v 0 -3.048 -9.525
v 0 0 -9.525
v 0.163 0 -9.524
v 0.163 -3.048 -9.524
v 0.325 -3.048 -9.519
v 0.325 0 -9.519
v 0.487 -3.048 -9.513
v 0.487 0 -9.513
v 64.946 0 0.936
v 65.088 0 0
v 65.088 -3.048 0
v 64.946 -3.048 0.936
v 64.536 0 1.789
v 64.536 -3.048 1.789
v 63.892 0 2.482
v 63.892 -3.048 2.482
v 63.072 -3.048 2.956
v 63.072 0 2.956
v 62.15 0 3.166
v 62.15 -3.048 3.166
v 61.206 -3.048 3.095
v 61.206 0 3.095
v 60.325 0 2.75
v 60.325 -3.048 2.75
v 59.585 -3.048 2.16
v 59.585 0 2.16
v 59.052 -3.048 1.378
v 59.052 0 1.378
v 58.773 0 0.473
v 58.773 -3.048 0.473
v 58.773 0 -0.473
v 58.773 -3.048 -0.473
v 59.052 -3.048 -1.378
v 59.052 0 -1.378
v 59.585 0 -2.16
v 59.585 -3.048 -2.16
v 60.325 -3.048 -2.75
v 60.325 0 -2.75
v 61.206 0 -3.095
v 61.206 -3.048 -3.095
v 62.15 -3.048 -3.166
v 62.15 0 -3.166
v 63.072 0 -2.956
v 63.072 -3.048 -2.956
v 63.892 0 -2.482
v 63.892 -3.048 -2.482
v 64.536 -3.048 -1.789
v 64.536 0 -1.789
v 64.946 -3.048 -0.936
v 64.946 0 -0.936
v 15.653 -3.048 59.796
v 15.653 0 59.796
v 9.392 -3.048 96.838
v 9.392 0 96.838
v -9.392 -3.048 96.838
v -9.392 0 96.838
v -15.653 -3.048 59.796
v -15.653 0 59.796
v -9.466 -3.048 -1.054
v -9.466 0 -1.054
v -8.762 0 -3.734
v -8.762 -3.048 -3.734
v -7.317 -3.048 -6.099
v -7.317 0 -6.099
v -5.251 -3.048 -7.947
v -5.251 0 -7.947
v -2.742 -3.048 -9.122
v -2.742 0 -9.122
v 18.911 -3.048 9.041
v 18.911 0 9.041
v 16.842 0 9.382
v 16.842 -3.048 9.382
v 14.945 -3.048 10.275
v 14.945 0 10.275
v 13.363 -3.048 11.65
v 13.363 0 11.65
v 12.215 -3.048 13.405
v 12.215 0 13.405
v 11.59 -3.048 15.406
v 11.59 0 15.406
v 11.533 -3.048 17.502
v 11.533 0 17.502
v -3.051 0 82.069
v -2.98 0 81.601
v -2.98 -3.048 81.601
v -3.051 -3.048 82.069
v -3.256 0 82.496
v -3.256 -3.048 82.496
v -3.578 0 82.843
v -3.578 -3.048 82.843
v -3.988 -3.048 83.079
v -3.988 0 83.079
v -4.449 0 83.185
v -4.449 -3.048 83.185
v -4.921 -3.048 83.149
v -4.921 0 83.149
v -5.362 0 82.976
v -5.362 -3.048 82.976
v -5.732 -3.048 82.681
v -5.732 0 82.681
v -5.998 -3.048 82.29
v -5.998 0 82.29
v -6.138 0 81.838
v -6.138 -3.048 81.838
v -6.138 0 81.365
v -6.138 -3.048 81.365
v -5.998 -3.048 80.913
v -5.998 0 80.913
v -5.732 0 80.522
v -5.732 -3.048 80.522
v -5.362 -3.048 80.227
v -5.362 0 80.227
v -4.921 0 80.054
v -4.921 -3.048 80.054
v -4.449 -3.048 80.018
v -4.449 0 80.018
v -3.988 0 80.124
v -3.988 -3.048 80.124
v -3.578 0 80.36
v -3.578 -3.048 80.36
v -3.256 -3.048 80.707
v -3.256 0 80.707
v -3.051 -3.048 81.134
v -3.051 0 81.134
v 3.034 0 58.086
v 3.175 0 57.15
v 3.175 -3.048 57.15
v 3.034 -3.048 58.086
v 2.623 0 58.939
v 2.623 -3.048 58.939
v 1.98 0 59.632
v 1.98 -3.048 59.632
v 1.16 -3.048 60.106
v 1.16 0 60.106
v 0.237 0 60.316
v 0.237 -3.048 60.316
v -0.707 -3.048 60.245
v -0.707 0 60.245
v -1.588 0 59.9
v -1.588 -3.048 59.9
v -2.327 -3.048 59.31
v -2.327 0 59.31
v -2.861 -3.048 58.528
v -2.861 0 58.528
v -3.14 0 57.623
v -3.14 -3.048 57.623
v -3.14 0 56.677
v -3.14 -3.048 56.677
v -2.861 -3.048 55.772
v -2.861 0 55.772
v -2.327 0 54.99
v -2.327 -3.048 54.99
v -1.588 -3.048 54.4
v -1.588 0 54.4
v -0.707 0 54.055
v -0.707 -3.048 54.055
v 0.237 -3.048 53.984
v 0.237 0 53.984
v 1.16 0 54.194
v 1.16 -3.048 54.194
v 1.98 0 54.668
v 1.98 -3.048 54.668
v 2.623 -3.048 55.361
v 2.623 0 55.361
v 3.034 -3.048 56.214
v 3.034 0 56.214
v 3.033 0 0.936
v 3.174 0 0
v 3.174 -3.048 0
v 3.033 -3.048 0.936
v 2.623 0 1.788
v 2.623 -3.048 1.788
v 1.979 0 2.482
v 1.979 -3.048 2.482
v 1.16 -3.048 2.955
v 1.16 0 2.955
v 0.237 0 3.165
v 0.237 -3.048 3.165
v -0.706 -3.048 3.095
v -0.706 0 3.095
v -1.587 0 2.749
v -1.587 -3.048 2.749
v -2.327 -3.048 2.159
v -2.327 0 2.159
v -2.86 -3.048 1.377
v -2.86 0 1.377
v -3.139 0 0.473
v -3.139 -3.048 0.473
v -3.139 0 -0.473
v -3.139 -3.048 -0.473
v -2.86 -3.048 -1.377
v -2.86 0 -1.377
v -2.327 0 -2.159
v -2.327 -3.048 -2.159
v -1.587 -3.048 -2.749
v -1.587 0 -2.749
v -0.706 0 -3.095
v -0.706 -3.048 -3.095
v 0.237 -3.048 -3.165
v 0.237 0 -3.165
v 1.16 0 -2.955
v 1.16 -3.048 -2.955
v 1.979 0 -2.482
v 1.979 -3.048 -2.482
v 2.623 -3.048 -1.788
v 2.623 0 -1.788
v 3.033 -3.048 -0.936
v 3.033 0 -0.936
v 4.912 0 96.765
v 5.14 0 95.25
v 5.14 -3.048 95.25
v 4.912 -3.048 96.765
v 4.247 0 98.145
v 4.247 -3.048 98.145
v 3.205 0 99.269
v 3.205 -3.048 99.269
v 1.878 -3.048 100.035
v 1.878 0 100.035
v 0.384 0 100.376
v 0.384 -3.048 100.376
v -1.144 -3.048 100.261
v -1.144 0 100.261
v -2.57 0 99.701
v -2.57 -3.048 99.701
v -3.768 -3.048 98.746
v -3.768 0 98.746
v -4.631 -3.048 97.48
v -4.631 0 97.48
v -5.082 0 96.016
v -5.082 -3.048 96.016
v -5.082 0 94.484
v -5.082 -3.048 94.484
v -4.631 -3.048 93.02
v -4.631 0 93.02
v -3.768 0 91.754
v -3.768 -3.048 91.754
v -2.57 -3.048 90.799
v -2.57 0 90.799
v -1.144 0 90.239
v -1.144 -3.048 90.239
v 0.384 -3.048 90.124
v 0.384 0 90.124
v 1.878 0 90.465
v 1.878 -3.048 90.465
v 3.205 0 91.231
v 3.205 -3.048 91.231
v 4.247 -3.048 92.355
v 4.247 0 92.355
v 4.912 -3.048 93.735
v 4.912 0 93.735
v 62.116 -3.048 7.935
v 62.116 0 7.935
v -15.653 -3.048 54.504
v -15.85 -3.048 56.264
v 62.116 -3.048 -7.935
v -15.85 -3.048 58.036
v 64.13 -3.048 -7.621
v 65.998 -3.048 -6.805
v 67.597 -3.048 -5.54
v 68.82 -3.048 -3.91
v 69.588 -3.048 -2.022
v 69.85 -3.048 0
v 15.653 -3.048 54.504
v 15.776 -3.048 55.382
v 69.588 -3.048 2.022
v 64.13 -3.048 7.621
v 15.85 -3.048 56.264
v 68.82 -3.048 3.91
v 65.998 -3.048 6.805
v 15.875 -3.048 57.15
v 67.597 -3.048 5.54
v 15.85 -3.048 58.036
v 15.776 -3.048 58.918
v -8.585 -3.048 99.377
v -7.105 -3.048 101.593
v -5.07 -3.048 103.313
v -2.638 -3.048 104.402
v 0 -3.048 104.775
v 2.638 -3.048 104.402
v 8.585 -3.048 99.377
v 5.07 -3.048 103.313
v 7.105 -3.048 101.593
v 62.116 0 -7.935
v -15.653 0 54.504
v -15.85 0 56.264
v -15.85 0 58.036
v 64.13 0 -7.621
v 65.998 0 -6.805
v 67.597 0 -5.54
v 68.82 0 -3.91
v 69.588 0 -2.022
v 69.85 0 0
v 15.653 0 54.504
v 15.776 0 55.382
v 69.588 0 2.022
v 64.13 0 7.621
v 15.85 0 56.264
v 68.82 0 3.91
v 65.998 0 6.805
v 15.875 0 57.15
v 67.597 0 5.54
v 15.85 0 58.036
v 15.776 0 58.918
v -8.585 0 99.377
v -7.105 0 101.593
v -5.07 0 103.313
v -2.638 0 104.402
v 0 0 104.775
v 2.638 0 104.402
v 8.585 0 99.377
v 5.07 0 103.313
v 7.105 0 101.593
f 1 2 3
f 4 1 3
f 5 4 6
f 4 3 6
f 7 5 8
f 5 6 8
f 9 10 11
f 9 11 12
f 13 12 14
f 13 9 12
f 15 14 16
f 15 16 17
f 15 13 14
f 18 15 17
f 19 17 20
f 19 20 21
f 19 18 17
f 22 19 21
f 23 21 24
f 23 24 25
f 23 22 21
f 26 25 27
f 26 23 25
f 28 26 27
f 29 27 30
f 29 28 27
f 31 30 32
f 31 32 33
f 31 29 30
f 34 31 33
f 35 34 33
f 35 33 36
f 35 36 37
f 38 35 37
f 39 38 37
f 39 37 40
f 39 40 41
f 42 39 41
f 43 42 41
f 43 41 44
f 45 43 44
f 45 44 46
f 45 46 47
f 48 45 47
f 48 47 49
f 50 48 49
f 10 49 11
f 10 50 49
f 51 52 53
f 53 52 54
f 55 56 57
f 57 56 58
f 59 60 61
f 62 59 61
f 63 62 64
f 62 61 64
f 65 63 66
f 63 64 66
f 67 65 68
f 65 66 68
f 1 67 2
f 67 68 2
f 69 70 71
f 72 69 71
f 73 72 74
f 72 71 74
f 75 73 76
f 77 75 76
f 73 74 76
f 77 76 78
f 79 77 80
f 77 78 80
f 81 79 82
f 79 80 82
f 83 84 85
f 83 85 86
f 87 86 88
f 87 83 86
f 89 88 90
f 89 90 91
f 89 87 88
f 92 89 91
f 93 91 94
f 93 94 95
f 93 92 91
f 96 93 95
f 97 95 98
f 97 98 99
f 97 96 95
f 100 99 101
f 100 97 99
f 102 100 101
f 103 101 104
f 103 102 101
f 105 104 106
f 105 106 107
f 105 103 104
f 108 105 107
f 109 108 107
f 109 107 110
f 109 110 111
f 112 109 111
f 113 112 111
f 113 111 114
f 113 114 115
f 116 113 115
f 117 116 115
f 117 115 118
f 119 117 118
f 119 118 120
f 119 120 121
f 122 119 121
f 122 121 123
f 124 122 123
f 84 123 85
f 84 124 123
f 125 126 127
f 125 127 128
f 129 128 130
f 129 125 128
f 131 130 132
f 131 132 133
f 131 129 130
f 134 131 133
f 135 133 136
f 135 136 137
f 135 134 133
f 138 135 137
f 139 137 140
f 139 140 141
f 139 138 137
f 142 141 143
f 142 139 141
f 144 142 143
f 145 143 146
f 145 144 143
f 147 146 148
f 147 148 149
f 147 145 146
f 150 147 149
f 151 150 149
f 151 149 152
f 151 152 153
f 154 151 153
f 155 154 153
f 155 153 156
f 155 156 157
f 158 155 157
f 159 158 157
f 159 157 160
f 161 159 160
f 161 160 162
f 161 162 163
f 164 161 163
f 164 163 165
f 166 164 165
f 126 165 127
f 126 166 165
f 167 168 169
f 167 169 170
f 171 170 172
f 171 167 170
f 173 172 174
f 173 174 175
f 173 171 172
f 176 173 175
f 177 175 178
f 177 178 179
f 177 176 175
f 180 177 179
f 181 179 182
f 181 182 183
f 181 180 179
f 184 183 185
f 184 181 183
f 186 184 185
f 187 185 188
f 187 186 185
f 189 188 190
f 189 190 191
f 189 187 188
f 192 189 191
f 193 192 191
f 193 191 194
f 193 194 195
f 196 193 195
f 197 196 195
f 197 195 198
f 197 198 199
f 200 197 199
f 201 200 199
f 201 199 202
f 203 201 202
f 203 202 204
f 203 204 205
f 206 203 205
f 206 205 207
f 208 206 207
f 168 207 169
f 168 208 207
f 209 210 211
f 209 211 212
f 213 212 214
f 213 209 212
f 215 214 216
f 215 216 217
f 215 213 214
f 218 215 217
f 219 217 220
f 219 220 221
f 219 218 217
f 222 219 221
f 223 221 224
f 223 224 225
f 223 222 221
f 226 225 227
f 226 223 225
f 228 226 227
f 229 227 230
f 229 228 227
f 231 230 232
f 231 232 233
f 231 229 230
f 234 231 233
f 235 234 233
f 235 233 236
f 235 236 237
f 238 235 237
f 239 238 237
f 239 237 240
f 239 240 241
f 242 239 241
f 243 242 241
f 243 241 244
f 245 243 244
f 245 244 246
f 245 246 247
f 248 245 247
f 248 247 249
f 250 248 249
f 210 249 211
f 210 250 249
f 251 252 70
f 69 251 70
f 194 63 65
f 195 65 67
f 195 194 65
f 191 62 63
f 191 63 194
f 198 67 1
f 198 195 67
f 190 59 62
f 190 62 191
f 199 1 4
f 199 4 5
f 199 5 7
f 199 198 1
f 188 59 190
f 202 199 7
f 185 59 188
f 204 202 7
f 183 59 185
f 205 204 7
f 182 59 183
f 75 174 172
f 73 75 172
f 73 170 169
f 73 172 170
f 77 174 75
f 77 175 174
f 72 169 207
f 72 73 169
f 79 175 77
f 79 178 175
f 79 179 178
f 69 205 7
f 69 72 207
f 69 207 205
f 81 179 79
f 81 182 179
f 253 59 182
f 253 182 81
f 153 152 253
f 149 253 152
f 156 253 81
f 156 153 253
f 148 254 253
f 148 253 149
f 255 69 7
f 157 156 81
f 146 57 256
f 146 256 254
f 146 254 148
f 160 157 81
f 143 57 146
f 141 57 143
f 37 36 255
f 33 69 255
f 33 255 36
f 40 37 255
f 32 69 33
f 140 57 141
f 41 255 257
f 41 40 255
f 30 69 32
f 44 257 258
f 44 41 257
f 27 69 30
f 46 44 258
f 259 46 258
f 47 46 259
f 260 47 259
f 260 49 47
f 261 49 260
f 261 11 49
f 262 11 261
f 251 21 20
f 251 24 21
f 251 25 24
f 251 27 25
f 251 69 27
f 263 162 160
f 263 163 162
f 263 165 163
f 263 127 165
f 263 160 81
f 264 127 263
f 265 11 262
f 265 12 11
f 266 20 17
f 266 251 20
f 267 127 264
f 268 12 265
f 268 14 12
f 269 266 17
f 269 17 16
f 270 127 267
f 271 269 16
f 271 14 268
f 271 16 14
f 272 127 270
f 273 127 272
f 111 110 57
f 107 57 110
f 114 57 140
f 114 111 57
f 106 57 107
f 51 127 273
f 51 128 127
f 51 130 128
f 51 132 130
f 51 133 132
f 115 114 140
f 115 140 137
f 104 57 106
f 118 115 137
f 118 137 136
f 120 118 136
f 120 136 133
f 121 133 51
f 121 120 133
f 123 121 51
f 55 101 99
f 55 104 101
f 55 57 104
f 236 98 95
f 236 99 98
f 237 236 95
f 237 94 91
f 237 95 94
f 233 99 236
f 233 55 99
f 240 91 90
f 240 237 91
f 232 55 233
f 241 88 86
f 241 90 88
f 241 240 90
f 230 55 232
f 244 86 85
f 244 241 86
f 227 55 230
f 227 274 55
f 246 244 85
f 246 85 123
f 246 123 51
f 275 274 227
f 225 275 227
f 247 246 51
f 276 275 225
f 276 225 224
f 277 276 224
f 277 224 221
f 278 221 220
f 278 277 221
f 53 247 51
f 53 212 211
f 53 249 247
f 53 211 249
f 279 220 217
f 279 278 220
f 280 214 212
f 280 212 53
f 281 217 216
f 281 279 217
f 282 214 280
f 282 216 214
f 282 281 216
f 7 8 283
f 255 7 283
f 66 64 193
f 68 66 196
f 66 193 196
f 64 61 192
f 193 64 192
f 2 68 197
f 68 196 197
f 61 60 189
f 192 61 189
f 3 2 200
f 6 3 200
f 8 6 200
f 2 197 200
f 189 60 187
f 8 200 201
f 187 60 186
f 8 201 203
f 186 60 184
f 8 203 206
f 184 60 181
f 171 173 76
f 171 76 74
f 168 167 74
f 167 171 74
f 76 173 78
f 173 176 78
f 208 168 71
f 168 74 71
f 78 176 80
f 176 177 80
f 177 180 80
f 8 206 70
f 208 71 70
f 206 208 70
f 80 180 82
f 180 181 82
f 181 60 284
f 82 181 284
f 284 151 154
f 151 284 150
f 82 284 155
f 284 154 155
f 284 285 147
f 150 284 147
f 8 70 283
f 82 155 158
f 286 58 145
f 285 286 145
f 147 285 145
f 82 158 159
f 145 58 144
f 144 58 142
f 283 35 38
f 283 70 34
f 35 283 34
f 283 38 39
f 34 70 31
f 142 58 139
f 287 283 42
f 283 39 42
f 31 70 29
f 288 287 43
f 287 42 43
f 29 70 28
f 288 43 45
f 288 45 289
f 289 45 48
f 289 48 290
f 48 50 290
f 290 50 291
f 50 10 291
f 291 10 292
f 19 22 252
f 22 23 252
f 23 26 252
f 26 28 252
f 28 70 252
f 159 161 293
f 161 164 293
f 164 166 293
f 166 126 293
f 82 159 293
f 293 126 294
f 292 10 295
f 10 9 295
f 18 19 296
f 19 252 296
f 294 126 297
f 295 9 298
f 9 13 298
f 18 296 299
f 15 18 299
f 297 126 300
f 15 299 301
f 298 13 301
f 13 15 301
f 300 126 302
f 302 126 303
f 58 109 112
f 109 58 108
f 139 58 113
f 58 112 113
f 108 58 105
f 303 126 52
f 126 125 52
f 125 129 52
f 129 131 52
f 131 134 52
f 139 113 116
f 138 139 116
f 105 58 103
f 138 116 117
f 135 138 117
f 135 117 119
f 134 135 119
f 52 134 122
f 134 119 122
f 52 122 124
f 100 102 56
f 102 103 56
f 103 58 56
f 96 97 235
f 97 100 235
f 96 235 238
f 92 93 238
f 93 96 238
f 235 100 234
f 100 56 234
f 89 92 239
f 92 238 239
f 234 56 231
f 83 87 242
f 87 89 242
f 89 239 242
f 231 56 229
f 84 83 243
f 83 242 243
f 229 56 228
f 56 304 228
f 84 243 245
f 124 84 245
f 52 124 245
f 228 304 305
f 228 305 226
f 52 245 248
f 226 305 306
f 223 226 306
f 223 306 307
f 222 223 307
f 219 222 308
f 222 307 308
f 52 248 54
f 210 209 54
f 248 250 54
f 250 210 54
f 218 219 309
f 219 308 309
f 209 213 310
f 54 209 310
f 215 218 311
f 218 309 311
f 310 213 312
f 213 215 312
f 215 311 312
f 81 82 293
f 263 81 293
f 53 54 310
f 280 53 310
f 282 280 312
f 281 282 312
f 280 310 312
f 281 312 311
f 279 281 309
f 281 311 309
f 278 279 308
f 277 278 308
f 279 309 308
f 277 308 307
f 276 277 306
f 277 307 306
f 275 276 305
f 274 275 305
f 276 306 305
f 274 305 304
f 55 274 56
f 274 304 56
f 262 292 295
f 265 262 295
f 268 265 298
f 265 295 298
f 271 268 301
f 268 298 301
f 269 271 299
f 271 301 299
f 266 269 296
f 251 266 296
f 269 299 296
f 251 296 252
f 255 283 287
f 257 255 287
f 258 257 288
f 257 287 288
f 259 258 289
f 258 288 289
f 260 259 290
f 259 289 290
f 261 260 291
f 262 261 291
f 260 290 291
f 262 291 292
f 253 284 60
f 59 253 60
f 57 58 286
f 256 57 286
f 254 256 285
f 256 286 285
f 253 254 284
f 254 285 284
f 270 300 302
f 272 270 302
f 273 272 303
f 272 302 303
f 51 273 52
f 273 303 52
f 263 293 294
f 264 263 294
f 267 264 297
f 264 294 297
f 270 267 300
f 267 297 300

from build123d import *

# Parameters (mm, degrees)
F0_R     = 5.139884
F0_R_2   = 1.5875
F0_R_3   = 3.175
F0_R_4   = 3.174261
F1_DEPTH = 3.048


with BuildPart() as f1:
    # F0 (on Front) → F1 (new body)
    with BuildSketch(Plane.XZ):
        with BuildLine():
            ThreePointArc((-9.391777, 96.8375), (-0.79654, 85.758364), (9.525, 95.25))
            ThreePointArc((9.525, 95.25), (9.491636, 96.04654), (9.391777, 96.8375))
            ThreePointArc((9.391777, 96.8375), (0, 104.775), (-9.391777, 96.8375))
        make_face()
        with Locations((0, 95.25)):
            Circle(F0_R, mode=Mode.SUBTRACT)
        with BuildLine():
            ThreePointArc((9.391777, 96.8375), (9.491636, 96.04654), (9.525, 95.25))
            ThreePointArc((9.525, 95.25), (-0.79654, 85.758364), (-9.391777, 96.8375))
            Line((-9.391777, 96.8375), (-15.652961, 59.795833))
            ThreePointArc((-15.652961, 59.795833), (0, 73.025), (15.652961, 59.795833))
            Line((15.652961, 59.795833), (9.391777, 96.8375))
        make_face()
        with Locations((-4.567989, 81.601493)):
            Circle(F0_R_2, mode=Mode.SUBTRACT)
        with BuildLine():
            ThreePointArc((15.875, 57.15), (15.819393, 58.477567), (15.652961, 59.795833))
            ThreePointArc((15.652961, 59.795833), (0, 73.025), (-15.652961, 59.795833))
            ThreePointArc((-15.652961, 59.795833), (-15.875, 57.15), (-15.652961, 54.504167))
            ThreePointArc((-15.652961, 54.504167), (0, 41.275), (15.652961, 54.504167))
            ThreePointArc((15.652961, 54.504167), (15.819393, 55.822433), (15.875, 57.15))
        make_face()
        with Locations((0, 57.15)):
            Circle(F0_R_3, mode=Mode.SUBTRACT)
        with BuildLine():
            ThreePointArc((15.652961, 54.504167), (0, 41.275), (-15.652961, 54.504167))
            Line((-15.652961, 54.504167), (-9.466493, -1.054103))
            ThreePointArc((-9.466493, -1.054103), (-0.527863, 9.510362), (9.525, 0))
            ThreePointArc((9.525, 0), (6.905344, -6.560628), (0.487342, -9.512525))
            Line((0.487342, -9.512525), (62.115626, -7.934901))
            ThreePointArc((62.115626, -7.934901), (53.975, 0), (62.115626, 7.934901))
            Line((62.115626, 7.934901), (18.910892, 9.0409))
            ThreePointArc((18.910892, 9.0409), (13.362859, 11.650215), (11.532699, 17.501687))
            Line((11.532699, 17.501687), (15.652961, 54.504167))
        make_face()
        with BuildLine():
            ThreePointArc((9.525, 0), (-0.527863, 9.510362), (-9.466493, -1.054103))
            ThreePointArc((-9.466493, -1.054103), (-6.351586, -7.098097), (0, -9.525))
            Line((0, -9.525), (0.487342, -9.512525))
            ThreePointArc((0.487342, -9.512525), (6.905344, -6.560628), (9.525, 0))
        make_face()
        Circle(F0_R_4, mode=Mode.SUBTRACT)
        with BuildLine():
            Line((0.487342, -9.512525), (0, -9.525))
            ThreePointArc((0, -9.525), (0.243751, -9.521881), (0.487342, -9.512525))
        make_face()
        with BuildLine():
            ThreePointArc((69.85, 0), (67.596522, 5.540379), (62.115626, 7.934901))
            ThreePointArc((62.115626, 7.934901), (53.975, 0), (62.115626, -7.934901))
            ThreePointArc((62.115626, -7.934901), (67.596522, -5.540379), (69.85, 0))
        make_face()
        with Locations((61.9125, 0)):
            Circle(F0_R_3, mode=Mode.SUBTRACT)
    extrude(amount=F1_DEPTH)


solid = f1.part
